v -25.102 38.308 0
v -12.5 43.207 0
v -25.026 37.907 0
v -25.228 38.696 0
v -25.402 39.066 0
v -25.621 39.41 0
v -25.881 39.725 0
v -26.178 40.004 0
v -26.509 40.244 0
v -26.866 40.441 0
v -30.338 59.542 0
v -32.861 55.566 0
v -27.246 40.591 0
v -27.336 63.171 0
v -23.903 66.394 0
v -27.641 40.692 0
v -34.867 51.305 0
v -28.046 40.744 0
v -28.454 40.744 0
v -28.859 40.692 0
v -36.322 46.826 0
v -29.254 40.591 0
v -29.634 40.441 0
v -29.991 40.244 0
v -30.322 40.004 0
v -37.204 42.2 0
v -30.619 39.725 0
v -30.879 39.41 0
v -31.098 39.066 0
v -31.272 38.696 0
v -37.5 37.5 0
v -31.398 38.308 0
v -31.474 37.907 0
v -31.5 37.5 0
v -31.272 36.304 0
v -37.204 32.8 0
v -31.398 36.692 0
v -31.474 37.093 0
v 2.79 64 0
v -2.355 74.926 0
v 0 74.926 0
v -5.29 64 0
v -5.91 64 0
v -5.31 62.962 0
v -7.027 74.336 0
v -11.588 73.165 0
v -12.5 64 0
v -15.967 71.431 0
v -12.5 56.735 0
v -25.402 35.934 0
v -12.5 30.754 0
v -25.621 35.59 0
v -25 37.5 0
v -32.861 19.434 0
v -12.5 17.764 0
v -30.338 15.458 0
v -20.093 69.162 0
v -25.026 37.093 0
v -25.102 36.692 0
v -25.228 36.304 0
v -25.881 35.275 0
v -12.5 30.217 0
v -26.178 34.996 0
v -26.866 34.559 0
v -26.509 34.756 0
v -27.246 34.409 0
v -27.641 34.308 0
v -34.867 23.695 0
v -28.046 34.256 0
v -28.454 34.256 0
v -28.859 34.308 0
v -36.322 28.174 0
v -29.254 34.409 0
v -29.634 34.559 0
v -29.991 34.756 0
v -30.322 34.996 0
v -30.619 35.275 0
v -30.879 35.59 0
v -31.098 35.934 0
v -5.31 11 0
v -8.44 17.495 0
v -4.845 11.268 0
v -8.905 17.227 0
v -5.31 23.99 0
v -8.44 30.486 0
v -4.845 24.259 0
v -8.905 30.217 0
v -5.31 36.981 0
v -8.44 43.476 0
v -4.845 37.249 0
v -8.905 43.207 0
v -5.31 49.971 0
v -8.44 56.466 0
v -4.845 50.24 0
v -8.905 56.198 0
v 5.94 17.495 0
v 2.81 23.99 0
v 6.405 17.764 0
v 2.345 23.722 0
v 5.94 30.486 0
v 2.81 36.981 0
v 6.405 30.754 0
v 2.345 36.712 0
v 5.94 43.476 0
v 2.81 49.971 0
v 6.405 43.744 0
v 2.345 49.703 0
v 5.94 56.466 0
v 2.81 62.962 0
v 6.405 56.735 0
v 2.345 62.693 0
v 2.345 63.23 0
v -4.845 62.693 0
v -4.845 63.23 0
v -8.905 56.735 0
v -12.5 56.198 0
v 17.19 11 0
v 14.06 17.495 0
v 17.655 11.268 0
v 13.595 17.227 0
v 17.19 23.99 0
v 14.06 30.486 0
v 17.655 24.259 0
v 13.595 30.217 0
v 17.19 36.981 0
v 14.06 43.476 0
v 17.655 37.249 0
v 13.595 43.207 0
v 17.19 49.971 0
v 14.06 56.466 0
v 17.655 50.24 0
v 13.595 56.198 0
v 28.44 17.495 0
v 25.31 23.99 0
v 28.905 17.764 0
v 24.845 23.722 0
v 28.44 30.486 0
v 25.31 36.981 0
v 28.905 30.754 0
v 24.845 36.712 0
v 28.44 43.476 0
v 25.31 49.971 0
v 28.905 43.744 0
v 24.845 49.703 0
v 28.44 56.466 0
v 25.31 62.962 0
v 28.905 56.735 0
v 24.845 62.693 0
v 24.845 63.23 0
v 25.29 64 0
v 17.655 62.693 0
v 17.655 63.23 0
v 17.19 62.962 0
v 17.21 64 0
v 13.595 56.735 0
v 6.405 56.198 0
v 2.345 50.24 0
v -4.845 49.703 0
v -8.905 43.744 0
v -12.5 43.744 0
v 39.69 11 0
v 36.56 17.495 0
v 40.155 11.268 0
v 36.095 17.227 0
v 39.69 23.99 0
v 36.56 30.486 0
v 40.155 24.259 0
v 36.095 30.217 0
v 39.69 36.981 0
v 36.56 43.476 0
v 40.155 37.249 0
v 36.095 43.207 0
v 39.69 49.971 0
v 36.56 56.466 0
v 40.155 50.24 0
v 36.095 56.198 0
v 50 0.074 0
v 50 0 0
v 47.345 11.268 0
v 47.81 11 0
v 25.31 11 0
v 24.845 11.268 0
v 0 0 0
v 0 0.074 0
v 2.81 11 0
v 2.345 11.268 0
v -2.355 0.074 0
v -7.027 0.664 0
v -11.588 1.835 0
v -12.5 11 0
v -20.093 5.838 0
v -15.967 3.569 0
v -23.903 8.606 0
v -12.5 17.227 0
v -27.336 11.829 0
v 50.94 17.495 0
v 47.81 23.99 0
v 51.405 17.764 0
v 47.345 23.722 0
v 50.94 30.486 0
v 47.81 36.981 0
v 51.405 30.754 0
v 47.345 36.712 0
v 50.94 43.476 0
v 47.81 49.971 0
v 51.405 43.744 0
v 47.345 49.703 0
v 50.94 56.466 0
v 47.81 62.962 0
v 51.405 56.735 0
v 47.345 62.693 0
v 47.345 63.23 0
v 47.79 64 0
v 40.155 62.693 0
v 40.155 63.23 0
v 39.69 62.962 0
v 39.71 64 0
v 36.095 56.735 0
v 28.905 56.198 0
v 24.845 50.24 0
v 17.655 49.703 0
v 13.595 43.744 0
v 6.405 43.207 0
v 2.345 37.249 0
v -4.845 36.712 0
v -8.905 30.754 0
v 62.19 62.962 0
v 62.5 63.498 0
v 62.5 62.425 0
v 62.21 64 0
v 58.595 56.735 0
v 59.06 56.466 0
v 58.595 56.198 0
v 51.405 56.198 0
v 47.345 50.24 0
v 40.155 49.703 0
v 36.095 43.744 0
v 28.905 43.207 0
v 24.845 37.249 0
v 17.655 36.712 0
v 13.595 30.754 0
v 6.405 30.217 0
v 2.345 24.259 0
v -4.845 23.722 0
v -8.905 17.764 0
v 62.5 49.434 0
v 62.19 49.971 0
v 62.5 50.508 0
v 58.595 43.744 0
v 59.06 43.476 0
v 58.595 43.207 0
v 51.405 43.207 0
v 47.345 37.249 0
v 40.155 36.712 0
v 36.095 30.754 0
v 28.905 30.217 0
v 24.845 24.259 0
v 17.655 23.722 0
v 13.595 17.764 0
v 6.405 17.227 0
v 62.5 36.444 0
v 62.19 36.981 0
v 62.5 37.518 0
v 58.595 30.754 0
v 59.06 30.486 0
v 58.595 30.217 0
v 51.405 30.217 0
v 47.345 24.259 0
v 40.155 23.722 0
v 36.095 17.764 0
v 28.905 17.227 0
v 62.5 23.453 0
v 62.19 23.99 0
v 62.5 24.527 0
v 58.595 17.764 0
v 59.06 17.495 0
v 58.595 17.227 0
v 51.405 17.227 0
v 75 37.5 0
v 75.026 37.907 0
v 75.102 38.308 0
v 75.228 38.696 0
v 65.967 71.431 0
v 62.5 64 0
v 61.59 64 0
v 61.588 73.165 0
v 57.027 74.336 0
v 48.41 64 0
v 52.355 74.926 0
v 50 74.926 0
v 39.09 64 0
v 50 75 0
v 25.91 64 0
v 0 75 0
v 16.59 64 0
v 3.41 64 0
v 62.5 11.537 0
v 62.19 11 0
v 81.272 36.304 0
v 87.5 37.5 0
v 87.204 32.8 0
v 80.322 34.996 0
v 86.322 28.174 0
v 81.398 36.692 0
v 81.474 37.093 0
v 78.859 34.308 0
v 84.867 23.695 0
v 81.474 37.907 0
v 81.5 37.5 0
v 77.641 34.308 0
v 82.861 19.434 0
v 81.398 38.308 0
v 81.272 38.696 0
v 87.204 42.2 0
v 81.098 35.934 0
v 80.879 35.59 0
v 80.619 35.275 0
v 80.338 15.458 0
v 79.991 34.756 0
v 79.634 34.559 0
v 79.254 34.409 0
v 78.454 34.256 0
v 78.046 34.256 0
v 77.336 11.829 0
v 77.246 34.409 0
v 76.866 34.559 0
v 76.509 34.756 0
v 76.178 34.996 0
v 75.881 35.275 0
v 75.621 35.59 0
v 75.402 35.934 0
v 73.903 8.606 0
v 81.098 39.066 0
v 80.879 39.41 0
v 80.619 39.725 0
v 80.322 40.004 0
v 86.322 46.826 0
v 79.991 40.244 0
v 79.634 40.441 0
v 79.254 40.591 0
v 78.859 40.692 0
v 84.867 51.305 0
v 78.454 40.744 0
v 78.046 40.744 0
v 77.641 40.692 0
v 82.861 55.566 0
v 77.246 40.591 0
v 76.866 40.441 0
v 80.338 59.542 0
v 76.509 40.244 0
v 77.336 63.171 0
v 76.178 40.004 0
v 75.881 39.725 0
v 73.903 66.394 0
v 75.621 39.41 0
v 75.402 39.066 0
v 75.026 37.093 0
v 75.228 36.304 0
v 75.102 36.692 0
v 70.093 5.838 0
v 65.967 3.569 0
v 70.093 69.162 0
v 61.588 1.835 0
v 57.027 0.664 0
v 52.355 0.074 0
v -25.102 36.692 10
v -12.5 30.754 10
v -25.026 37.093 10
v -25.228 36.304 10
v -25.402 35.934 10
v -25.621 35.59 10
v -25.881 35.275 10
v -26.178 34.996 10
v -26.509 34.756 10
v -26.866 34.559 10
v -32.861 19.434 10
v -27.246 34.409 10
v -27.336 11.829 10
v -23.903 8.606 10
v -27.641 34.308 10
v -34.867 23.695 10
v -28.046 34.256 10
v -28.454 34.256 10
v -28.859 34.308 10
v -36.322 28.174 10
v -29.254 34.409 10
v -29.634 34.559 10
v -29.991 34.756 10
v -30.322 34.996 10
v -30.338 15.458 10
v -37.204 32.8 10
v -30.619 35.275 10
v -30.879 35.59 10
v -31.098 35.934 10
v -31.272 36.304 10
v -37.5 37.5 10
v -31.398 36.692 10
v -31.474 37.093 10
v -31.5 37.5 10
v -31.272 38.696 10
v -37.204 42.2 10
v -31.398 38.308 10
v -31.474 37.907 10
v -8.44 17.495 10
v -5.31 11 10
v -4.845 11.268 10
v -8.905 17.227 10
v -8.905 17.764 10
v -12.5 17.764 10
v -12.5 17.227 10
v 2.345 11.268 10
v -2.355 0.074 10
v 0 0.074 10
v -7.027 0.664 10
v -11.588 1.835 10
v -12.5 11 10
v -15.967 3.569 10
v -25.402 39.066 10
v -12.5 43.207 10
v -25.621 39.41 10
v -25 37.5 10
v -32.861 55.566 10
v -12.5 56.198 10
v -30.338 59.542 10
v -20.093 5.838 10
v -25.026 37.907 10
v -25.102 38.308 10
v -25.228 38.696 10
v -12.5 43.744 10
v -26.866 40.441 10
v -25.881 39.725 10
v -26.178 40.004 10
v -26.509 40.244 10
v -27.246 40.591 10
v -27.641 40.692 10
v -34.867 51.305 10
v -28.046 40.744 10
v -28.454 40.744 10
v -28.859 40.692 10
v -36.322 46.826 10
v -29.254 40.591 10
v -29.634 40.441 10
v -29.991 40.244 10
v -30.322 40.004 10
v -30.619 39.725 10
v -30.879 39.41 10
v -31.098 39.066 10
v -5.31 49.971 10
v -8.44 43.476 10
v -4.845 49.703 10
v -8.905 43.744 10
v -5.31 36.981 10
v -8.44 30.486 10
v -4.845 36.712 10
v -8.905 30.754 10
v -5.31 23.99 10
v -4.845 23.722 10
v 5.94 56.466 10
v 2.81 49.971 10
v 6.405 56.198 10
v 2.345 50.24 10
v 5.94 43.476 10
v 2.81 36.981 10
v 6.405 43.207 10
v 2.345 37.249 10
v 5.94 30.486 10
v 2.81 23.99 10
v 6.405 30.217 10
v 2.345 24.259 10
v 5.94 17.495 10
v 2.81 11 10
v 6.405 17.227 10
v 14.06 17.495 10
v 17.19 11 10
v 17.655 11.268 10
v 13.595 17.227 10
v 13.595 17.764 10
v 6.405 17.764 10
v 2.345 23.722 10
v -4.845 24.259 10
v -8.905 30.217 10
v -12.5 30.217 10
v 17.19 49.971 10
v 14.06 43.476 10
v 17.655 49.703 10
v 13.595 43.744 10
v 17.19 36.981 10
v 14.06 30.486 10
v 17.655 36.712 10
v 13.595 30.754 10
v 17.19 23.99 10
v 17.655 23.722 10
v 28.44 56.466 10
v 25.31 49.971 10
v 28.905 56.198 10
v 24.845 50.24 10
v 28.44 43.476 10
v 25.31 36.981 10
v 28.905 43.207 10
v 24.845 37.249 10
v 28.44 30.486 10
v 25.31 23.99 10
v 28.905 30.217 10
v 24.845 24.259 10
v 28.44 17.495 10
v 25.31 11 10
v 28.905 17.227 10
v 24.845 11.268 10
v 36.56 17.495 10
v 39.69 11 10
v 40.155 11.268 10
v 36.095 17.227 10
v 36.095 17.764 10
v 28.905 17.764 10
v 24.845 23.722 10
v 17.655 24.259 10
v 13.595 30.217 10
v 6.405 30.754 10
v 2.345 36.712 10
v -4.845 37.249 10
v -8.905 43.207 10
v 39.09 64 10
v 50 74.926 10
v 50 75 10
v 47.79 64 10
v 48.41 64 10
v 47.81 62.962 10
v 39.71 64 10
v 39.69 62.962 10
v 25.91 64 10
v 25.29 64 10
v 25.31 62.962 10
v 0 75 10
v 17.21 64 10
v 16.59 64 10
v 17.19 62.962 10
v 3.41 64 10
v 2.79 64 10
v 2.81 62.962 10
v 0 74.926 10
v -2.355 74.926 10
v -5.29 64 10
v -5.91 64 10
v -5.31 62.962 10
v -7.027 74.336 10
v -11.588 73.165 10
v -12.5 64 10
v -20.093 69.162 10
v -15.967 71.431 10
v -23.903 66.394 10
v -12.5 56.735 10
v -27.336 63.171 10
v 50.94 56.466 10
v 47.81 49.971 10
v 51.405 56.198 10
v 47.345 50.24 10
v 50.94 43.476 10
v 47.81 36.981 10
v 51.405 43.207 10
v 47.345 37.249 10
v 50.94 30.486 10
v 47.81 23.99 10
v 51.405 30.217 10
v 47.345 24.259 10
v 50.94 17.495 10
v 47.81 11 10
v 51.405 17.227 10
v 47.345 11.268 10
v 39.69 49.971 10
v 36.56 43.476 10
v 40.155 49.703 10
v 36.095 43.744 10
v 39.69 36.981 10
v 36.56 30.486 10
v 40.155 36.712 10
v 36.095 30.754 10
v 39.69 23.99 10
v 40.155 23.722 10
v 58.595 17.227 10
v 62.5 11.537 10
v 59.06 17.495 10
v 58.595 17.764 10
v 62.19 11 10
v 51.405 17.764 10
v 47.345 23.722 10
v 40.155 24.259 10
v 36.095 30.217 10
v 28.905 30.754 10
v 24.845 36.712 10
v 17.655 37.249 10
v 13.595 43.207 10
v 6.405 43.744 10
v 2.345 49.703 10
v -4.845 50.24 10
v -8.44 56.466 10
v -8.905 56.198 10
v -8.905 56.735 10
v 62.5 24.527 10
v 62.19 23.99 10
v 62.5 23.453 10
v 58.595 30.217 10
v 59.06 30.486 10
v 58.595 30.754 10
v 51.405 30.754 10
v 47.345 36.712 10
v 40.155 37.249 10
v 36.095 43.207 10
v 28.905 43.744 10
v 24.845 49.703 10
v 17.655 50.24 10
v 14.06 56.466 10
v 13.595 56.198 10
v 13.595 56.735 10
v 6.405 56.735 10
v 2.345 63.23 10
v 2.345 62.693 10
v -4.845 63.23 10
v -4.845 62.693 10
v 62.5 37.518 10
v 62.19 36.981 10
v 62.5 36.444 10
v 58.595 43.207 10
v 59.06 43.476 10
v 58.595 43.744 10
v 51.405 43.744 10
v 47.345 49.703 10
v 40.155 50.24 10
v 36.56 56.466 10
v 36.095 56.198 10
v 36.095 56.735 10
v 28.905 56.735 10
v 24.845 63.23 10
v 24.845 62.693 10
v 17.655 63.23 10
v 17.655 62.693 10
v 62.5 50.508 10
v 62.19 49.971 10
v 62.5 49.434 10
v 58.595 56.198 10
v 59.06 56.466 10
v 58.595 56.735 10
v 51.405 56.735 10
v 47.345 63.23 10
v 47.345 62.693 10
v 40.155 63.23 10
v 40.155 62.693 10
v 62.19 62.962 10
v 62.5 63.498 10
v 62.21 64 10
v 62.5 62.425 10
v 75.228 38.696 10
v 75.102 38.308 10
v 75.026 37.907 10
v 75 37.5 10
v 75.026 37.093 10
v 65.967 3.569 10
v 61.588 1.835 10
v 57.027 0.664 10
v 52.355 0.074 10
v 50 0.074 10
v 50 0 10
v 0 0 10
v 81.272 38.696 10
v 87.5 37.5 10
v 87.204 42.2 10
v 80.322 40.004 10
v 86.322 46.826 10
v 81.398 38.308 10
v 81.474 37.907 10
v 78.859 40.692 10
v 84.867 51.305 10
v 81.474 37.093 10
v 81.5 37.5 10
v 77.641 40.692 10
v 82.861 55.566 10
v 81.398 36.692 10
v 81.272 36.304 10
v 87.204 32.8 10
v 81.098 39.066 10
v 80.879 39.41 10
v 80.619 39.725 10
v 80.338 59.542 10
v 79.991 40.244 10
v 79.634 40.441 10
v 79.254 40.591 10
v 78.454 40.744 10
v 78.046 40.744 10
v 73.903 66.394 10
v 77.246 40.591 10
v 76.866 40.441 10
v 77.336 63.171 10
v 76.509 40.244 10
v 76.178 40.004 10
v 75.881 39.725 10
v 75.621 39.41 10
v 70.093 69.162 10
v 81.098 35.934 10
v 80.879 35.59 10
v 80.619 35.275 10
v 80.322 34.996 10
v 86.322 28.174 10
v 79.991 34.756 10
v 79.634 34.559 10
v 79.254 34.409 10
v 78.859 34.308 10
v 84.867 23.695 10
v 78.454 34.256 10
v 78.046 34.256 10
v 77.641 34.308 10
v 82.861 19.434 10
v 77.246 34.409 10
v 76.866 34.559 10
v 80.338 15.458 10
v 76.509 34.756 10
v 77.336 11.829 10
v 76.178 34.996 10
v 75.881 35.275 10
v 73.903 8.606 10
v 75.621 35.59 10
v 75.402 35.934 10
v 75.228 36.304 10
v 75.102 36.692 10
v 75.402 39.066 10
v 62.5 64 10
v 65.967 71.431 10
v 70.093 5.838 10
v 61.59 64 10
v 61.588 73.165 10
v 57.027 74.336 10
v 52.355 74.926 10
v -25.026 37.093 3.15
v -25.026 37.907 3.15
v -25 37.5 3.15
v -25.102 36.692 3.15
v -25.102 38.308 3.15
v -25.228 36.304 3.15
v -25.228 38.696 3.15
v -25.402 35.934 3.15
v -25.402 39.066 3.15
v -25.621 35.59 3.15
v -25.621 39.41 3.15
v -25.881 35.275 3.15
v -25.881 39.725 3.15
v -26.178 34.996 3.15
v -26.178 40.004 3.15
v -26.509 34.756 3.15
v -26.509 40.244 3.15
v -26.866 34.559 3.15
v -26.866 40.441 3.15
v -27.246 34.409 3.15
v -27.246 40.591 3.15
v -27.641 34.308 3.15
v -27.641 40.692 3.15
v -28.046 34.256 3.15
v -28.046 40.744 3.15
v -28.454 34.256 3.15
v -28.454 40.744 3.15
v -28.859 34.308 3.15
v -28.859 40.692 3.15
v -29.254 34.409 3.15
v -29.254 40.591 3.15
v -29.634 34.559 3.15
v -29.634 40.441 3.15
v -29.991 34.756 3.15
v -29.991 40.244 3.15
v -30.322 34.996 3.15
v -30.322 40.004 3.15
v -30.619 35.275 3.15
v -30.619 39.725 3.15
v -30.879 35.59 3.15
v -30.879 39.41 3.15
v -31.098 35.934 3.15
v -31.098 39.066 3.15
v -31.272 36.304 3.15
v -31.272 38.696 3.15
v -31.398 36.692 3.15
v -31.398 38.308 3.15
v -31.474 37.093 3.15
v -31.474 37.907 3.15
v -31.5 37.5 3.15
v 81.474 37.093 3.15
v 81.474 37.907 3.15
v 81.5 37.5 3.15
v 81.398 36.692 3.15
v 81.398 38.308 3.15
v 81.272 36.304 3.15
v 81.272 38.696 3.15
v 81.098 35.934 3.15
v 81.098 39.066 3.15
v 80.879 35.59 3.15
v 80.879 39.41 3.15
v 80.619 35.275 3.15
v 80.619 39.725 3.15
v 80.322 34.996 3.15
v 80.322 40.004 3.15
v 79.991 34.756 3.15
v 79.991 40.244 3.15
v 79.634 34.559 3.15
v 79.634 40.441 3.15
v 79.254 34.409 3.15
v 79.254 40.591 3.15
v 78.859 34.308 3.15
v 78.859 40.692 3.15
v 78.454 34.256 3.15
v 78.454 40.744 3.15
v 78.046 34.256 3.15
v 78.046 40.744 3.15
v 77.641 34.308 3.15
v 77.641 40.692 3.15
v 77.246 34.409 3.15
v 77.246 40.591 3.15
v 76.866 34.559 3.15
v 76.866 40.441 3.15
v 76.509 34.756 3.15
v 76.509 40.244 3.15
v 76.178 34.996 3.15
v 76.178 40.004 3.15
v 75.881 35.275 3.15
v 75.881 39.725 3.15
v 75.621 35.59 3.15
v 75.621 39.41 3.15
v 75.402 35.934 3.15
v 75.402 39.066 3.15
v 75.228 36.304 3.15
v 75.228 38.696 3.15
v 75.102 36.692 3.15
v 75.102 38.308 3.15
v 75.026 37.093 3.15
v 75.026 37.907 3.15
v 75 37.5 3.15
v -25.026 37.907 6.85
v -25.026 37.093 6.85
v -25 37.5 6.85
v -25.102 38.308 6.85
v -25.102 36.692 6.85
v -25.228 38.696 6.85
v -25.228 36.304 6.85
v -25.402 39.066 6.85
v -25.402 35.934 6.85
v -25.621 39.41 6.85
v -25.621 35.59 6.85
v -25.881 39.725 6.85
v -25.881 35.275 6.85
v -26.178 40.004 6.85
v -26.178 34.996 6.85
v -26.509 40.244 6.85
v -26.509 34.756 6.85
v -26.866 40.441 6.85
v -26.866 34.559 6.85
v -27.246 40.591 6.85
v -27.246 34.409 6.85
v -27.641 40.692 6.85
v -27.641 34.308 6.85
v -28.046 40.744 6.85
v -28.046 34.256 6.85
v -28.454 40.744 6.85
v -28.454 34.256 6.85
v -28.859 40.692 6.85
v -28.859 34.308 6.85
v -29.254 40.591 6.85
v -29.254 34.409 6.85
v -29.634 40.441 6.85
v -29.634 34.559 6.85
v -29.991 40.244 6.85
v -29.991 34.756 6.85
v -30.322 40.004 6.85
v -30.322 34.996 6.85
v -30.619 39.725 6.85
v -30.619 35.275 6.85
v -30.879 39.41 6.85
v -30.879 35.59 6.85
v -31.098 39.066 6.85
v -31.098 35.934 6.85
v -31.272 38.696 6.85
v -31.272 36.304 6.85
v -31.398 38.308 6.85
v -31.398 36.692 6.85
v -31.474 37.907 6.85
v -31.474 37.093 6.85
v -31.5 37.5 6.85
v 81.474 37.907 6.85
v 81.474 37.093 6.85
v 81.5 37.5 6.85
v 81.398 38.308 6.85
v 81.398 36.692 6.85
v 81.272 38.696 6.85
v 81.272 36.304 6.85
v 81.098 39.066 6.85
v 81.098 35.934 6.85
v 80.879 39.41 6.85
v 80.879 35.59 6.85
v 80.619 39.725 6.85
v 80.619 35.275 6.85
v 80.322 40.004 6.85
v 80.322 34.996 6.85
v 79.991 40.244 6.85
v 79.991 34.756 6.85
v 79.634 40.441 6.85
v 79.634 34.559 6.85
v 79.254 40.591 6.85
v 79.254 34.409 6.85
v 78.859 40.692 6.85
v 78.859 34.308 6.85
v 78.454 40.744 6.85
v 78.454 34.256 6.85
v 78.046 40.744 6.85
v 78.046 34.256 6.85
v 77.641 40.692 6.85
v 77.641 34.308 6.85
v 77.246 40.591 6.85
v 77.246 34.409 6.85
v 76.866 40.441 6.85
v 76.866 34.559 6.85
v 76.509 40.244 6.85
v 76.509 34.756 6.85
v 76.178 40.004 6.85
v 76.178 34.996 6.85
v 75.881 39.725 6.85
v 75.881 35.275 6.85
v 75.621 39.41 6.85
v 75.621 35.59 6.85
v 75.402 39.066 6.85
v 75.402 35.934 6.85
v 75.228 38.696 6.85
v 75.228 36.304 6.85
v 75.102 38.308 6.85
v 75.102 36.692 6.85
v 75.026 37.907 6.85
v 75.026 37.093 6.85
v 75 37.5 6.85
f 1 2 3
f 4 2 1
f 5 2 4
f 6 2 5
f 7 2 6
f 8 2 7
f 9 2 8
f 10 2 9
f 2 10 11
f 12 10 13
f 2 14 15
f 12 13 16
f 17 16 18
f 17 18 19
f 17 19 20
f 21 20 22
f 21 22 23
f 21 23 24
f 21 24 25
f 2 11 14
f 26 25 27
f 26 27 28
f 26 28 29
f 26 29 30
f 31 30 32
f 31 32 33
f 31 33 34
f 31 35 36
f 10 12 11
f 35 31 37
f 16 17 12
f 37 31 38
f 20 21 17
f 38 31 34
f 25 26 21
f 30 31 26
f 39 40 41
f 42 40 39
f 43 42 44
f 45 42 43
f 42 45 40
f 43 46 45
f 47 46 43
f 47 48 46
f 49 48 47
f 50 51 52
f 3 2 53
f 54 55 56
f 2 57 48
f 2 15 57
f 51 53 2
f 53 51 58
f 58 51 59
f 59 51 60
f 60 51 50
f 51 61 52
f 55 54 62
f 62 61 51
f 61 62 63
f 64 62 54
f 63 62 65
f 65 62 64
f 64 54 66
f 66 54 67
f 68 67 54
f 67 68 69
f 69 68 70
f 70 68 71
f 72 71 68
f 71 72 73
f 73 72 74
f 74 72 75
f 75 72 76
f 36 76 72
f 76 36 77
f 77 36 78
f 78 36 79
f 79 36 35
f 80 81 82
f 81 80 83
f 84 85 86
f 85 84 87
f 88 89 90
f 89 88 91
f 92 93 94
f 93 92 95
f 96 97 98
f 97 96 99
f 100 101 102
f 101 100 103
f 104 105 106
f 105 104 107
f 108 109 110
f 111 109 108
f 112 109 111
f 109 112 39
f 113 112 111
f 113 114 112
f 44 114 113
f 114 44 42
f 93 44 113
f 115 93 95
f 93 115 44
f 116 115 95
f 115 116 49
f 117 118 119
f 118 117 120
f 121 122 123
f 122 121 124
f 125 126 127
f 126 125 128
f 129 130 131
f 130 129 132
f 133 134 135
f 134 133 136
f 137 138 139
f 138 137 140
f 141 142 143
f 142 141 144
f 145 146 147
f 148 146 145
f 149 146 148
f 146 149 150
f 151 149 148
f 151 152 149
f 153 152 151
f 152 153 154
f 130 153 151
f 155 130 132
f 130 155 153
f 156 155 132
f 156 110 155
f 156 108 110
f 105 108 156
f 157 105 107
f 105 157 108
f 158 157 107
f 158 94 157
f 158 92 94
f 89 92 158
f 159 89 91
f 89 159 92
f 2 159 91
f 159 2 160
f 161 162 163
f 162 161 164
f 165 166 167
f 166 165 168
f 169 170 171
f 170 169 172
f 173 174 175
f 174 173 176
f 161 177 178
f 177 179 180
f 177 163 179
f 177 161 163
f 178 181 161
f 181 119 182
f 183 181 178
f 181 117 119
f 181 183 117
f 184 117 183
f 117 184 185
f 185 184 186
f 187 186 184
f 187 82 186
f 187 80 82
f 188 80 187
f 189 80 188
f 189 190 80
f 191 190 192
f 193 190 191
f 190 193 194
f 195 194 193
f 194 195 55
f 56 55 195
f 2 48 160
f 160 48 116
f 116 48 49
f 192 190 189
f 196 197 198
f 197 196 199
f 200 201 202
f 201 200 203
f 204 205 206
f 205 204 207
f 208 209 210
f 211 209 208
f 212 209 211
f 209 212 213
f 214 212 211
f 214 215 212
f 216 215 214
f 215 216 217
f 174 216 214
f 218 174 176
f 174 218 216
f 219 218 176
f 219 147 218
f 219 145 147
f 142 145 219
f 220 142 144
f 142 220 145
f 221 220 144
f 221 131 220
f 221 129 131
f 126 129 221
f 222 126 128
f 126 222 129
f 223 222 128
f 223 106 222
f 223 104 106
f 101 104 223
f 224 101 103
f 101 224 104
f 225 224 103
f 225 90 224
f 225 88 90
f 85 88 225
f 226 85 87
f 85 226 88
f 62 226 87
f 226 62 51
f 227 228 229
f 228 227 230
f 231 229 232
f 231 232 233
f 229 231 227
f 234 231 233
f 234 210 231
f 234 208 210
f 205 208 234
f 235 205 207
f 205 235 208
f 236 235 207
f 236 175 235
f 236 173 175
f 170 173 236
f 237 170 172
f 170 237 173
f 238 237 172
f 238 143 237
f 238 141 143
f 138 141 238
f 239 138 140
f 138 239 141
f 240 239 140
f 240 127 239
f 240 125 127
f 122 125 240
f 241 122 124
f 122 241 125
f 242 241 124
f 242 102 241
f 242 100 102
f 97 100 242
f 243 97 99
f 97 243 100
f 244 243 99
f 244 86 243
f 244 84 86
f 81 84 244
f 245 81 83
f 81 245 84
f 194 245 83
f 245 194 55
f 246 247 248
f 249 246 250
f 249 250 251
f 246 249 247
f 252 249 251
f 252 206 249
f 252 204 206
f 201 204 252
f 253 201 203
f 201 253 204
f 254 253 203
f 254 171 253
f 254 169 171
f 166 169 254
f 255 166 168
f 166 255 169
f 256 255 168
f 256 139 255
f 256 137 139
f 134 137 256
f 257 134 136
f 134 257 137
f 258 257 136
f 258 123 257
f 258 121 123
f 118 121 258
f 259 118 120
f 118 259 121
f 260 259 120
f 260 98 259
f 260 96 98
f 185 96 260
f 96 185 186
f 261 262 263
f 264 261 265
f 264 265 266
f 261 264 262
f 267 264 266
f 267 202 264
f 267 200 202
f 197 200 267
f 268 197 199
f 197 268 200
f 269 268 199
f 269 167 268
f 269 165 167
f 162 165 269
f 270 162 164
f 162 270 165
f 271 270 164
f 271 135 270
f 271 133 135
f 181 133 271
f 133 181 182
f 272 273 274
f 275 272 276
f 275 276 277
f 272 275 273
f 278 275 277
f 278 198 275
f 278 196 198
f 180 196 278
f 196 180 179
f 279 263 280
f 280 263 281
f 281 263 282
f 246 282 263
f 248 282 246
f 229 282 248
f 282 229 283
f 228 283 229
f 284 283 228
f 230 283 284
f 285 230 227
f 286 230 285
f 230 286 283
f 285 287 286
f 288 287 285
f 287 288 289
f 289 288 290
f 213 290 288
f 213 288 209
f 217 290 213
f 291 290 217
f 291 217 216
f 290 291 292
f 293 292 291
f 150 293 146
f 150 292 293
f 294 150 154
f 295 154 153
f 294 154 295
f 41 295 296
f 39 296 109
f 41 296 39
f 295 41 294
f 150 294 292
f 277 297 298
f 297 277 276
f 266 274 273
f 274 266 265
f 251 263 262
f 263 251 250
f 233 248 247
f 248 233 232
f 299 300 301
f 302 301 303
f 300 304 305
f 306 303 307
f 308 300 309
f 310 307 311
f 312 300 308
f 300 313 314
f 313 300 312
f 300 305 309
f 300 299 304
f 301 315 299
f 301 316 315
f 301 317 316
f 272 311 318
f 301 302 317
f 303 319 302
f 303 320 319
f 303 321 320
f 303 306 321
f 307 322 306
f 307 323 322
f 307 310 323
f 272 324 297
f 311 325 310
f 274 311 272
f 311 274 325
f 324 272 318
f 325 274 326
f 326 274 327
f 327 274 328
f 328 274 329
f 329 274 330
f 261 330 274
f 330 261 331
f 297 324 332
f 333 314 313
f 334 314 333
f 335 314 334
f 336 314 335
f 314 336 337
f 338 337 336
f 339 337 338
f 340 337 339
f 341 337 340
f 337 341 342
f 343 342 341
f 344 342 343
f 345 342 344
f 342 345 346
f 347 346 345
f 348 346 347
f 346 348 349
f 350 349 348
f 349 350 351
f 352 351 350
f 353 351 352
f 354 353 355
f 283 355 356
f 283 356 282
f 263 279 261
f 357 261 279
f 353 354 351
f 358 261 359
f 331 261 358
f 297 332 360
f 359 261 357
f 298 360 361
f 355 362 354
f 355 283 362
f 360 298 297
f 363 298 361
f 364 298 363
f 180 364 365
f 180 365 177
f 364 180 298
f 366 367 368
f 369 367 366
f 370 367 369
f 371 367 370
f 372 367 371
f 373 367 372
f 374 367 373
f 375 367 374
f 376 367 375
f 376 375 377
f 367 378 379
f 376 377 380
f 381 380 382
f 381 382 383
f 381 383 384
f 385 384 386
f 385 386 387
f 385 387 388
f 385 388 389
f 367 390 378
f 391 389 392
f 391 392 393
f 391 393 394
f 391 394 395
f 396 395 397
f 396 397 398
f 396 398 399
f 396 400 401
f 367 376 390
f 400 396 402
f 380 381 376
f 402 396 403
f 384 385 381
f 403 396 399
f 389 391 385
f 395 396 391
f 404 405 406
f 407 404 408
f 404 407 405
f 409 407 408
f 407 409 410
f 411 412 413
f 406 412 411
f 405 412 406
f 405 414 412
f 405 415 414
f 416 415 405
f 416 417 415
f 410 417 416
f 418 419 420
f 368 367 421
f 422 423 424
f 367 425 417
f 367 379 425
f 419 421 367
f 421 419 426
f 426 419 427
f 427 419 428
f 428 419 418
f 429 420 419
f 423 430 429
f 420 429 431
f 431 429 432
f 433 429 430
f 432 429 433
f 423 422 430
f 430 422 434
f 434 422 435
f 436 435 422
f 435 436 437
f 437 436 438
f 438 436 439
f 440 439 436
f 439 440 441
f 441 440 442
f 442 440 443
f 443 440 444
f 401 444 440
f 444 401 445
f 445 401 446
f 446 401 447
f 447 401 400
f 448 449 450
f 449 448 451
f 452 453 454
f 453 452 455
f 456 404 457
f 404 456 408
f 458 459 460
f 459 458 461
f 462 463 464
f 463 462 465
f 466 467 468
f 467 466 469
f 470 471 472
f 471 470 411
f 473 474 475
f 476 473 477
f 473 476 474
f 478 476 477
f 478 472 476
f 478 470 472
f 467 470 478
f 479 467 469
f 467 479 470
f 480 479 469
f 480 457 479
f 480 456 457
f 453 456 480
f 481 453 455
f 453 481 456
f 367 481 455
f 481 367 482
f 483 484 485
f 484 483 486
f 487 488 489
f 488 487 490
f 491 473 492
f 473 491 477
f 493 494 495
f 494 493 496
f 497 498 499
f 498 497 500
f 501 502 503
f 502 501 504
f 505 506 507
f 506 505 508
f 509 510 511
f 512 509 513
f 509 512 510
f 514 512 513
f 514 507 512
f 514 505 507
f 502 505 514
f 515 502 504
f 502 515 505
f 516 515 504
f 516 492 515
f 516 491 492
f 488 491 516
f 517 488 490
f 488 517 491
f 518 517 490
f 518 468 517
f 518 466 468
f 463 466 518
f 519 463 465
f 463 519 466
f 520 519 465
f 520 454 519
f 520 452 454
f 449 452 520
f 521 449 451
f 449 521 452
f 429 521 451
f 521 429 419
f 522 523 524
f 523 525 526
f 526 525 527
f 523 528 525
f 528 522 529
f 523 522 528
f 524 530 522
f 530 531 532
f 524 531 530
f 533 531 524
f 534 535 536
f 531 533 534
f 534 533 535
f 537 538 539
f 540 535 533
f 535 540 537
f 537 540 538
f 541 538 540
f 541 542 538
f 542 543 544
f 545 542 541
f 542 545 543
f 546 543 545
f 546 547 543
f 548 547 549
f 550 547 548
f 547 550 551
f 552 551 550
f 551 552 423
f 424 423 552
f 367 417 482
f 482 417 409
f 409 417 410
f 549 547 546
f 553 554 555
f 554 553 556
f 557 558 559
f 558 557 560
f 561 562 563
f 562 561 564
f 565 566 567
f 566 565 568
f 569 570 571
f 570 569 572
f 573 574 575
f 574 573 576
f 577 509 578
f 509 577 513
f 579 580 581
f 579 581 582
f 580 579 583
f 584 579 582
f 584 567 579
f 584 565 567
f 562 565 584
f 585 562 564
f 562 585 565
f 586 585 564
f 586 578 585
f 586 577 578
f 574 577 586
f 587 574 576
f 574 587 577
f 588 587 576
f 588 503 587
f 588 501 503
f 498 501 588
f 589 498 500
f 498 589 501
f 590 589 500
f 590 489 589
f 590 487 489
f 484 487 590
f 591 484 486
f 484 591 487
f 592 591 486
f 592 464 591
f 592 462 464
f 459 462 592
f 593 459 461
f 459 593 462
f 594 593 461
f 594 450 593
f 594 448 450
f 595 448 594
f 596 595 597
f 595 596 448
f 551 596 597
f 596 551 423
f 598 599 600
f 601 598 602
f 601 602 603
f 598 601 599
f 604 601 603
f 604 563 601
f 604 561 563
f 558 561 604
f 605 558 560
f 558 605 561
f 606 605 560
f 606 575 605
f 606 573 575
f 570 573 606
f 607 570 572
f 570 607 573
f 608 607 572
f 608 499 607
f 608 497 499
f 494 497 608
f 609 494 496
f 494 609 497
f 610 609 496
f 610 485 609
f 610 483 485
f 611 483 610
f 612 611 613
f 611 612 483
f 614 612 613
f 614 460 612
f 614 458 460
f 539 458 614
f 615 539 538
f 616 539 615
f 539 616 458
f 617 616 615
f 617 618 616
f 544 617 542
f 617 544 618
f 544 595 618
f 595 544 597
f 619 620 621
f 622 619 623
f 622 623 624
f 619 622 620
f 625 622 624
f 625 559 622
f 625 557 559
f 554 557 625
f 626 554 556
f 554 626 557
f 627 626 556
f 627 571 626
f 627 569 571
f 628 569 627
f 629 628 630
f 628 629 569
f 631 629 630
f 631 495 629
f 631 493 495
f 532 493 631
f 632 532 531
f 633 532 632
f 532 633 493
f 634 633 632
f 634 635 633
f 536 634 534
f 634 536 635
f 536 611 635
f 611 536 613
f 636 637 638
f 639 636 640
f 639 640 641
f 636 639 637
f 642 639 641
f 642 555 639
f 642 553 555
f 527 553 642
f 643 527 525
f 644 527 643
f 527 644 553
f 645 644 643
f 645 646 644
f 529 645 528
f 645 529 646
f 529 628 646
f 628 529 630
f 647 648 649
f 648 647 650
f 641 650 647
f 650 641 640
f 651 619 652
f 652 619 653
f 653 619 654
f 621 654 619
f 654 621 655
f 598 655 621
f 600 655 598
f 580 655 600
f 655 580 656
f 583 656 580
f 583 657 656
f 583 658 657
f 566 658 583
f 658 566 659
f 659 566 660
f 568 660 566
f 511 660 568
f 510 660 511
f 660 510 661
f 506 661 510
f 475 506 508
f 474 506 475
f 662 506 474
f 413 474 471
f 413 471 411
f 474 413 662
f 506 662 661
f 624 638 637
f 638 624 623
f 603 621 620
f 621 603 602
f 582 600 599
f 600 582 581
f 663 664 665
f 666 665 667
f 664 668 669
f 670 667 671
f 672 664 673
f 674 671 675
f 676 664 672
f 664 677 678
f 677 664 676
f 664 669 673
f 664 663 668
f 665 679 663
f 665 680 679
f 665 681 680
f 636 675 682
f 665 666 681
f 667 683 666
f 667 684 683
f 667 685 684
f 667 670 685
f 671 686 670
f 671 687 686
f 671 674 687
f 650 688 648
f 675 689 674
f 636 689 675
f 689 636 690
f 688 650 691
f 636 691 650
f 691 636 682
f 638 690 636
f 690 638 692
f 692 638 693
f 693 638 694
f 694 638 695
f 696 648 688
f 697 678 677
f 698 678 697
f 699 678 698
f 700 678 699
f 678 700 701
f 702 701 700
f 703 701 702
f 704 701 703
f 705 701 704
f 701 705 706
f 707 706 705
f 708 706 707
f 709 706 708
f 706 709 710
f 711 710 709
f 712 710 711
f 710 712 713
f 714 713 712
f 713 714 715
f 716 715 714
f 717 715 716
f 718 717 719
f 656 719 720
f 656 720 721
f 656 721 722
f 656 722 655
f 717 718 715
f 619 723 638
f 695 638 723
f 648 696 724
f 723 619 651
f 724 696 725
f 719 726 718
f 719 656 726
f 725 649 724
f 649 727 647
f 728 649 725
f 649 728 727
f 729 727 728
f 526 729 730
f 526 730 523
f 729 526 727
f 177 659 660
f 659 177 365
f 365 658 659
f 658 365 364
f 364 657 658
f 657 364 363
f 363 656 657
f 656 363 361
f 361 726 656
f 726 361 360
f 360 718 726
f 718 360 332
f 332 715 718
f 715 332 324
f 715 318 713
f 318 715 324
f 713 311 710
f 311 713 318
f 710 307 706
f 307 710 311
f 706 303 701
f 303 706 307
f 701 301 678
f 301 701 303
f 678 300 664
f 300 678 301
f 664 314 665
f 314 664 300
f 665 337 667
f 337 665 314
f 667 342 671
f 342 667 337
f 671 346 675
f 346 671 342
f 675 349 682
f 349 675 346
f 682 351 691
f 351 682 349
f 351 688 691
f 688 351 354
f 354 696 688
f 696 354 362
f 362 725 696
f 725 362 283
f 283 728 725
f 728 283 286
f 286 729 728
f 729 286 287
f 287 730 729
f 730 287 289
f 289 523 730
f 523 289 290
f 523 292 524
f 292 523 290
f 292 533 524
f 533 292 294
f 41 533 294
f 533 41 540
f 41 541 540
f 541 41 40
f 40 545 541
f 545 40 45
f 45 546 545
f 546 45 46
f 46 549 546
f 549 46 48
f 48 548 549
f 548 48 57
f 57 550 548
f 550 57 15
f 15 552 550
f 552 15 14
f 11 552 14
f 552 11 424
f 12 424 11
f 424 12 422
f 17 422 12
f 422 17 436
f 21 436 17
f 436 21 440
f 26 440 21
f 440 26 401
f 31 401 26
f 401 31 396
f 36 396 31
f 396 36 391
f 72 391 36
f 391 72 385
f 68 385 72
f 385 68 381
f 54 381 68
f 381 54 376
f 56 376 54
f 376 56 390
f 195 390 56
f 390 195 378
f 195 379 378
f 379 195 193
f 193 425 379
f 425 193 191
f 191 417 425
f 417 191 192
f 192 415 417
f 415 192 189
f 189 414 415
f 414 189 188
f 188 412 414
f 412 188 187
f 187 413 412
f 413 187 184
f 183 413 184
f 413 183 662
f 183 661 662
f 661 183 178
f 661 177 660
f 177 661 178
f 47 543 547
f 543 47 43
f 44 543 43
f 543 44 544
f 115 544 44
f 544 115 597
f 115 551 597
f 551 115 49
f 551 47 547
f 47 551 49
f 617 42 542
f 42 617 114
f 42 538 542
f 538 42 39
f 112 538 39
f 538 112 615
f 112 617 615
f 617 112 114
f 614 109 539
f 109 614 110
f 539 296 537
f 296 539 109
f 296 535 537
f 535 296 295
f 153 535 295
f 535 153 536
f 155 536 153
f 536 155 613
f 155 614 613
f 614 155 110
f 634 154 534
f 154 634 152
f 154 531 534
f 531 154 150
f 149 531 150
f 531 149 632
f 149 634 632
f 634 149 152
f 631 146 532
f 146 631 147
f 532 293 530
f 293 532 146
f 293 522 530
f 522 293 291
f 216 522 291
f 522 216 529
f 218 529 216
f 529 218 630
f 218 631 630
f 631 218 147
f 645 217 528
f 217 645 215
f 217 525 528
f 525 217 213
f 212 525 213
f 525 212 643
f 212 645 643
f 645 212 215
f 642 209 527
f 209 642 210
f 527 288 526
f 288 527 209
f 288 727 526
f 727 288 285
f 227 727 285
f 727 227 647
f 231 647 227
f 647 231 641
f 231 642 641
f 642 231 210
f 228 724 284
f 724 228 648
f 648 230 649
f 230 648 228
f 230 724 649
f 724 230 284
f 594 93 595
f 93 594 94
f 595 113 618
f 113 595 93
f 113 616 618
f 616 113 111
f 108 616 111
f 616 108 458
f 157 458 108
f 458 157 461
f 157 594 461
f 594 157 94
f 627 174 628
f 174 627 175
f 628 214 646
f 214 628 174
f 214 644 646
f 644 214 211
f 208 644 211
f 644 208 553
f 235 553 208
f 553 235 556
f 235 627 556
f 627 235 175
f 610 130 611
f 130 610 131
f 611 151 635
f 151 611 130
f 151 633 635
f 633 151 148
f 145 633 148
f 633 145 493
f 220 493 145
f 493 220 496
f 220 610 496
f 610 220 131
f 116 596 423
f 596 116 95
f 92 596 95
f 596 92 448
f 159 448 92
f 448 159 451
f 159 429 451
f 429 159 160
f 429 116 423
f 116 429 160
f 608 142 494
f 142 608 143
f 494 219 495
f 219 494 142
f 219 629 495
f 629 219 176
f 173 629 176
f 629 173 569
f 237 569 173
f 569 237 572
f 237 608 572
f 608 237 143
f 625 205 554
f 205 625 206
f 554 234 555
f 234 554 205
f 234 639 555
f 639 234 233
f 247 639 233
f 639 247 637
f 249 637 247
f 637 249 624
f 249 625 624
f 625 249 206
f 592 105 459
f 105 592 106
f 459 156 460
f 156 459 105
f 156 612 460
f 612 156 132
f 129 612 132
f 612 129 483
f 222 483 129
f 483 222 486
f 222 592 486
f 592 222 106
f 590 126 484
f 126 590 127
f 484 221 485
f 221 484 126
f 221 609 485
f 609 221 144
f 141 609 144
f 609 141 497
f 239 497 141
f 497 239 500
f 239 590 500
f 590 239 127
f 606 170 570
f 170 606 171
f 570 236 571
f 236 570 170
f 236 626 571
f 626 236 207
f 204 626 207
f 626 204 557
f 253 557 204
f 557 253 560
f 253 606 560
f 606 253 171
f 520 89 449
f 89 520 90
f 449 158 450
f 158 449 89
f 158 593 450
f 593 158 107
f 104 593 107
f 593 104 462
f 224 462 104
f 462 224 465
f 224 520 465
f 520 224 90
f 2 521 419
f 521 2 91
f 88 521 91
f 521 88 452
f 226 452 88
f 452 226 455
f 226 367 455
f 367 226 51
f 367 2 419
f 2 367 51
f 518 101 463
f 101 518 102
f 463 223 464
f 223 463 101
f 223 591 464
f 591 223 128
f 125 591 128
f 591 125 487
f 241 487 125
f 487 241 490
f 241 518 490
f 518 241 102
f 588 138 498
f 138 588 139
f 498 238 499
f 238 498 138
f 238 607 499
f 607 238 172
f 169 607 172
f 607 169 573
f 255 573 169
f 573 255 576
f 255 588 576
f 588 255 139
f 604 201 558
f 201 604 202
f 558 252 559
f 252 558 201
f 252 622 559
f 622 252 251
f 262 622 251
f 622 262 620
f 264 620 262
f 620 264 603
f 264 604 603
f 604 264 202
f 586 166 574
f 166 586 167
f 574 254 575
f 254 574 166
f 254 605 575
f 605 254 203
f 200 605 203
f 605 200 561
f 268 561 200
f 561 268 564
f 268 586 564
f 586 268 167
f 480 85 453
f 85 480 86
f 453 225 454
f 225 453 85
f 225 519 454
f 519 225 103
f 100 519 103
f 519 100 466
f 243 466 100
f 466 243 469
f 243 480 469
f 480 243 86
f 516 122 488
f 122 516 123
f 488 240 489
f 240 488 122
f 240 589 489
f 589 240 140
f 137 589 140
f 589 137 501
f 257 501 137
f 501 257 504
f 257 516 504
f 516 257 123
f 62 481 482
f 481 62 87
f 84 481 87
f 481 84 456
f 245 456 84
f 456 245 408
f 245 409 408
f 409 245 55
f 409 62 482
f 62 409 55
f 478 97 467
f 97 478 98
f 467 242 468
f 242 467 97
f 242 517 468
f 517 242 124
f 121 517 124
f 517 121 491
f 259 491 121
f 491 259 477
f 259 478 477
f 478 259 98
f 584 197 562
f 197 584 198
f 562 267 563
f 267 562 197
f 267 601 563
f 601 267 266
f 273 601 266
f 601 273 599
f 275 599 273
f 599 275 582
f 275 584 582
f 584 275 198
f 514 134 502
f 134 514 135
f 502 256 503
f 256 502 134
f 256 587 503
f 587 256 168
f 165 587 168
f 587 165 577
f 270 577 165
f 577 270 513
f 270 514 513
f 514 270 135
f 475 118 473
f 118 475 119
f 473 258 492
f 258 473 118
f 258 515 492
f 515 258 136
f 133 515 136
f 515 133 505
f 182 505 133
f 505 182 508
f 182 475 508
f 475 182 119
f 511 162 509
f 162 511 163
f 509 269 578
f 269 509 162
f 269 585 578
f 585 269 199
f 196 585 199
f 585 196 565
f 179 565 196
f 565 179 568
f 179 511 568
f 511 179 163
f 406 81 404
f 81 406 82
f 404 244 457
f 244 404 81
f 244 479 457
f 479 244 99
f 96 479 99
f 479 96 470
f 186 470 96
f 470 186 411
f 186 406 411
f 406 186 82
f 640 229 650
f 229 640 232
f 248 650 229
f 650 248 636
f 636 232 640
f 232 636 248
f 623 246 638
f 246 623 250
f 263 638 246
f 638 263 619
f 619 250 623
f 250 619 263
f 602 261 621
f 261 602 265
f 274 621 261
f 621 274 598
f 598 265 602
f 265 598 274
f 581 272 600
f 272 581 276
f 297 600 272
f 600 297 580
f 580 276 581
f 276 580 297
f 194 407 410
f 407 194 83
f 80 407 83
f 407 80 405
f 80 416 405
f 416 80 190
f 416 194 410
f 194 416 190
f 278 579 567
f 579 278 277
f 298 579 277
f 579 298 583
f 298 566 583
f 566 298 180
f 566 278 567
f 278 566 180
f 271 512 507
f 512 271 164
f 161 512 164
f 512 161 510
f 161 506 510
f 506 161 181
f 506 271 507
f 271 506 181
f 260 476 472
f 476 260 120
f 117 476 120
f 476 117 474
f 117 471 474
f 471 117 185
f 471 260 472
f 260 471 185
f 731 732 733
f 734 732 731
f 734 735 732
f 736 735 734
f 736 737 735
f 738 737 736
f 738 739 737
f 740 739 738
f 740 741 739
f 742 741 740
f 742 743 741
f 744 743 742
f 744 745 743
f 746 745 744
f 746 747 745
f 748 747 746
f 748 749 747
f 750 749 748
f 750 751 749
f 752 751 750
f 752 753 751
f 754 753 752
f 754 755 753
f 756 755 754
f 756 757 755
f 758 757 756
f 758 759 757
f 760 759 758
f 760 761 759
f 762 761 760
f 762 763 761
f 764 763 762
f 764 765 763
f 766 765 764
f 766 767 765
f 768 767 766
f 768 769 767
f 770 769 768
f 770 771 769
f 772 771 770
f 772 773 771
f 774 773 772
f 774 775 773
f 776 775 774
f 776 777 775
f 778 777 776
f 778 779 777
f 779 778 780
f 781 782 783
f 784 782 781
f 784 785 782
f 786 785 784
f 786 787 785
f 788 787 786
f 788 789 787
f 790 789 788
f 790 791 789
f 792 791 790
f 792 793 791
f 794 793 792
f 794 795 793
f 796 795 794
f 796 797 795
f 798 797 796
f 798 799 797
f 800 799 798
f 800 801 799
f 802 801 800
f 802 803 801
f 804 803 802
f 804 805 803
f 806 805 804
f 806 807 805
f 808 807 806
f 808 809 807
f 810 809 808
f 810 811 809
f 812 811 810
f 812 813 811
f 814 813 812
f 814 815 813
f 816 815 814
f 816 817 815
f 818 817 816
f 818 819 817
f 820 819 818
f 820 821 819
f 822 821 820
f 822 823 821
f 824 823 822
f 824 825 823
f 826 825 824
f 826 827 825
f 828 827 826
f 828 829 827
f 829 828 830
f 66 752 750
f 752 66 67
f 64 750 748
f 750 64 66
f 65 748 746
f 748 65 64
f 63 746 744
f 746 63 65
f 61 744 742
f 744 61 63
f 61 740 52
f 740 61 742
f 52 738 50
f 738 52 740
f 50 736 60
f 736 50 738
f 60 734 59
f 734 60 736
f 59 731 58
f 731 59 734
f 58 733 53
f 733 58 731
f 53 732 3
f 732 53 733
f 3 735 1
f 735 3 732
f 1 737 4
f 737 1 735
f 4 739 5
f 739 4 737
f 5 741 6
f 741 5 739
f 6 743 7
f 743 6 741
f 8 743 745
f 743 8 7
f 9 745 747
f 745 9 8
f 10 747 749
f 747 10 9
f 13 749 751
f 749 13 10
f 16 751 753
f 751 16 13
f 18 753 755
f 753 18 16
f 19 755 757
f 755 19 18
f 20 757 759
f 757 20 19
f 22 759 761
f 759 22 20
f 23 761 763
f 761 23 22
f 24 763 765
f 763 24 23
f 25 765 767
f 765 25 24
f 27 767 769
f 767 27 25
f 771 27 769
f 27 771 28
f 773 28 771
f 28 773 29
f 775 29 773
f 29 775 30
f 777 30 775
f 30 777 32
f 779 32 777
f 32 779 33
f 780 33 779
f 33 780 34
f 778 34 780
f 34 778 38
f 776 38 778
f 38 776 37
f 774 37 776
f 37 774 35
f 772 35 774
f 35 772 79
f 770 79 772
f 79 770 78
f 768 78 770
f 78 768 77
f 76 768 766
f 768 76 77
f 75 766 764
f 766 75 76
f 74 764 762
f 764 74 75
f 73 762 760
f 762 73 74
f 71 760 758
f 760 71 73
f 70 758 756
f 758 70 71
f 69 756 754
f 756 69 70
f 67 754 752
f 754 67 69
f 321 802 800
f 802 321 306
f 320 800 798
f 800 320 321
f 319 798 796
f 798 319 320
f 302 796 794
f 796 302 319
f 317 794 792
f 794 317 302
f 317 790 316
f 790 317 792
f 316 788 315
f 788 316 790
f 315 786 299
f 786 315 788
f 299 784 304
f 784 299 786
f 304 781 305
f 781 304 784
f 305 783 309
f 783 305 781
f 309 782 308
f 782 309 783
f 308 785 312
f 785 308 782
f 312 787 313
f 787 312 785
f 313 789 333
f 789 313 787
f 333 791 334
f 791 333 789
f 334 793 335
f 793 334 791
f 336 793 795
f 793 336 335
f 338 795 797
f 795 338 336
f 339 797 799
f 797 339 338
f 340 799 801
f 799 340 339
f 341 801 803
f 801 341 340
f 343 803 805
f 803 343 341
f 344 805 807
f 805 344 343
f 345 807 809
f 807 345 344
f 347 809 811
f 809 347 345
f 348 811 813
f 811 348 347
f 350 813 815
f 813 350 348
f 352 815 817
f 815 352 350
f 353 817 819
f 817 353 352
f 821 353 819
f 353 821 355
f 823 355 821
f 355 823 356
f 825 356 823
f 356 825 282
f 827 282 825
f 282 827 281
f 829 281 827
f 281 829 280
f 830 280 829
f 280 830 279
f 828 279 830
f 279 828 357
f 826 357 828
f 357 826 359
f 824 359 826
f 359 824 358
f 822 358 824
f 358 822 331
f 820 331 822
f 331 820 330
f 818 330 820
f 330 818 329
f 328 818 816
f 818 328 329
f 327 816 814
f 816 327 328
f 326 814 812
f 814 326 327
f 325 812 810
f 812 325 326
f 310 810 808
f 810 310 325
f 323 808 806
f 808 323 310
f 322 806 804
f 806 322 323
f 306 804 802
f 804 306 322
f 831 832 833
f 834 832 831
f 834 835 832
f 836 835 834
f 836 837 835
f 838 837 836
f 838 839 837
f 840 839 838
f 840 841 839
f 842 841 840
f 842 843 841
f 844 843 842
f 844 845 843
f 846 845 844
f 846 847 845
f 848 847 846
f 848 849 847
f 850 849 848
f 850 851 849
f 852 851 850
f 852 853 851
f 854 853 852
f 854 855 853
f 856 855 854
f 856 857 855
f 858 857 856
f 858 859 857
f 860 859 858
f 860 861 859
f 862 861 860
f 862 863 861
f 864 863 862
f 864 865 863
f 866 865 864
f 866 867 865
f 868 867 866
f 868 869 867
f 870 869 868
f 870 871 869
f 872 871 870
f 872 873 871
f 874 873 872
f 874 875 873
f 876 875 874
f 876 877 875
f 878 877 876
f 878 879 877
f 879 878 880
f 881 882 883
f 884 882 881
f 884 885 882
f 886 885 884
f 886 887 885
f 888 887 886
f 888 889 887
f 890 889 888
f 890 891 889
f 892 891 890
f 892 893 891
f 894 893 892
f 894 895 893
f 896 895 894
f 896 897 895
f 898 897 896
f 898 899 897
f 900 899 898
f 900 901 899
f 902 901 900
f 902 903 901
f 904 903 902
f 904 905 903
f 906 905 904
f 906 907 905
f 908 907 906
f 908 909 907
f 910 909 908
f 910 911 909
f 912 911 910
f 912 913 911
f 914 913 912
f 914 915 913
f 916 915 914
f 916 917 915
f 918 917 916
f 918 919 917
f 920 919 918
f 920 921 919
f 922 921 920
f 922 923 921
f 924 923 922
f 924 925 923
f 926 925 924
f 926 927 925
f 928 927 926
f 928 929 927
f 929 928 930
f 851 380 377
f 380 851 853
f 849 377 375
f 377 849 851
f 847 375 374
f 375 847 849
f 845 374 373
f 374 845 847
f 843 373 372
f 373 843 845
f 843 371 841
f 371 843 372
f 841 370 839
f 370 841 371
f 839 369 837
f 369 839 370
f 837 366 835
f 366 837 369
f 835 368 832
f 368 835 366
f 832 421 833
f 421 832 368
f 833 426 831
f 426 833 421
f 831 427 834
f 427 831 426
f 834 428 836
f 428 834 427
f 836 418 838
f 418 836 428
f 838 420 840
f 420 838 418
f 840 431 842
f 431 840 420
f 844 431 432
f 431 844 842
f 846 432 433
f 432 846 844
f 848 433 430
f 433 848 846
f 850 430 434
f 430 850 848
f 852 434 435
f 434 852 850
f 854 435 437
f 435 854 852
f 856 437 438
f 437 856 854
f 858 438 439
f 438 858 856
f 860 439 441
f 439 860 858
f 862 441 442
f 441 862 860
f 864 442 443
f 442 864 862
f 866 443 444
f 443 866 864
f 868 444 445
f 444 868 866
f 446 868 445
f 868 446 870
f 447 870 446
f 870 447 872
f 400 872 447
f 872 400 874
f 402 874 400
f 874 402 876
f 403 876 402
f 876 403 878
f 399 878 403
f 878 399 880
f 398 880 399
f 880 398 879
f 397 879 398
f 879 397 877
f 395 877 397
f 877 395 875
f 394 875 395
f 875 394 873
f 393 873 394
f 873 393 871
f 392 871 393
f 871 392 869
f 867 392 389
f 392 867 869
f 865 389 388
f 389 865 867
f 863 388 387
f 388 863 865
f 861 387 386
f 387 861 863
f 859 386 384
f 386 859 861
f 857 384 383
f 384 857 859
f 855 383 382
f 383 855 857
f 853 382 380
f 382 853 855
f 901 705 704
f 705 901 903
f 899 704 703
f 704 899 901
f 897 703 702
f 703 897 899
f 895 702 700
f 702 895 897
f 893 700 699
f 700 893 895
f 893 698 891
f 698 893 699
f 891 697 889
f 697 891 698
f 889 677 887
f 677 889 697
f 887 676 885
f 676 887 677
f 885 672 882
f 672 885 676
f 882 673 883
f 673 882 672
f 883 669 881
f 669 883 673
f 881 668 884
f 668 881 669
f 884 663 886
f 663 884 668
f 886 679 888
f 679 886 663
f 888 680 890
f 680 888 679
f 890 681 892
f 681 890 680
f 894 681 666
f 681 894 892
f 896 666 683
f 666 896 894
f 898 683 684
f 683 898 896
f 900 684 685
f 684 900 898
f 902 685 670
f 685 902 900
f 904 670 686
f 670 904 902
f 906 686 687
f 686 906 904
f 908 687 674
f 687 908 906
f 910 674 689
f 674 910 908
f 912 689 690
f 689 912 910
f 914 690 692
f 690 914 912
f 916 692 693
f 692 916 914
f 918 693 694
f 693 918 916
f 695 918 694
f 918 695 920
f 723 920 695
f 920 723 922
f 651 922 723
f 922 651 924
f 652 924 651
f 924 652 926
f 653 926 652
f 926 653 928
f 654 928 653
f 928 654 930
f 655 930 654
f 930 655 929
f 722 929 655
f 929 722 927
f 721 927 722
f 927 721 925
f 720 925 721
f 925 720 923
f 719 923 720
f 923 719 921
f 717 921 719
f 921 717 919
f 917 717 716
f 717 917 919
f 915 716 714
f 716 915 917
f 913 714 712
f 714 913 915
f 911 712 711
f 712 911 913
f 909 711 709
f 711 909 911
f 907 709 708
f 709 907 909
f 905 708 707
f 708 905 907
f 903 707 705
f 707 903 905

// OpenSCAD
//////////////////////
/// Thing: Customizable Grid for Canon Speedlight
/// For use with http://www.thingiverse.com/thing:1185771 (Canon Speedlite 600EX-RT - CGprods KIT)
/// Author: Kim Quermann
/// Creative Commons - Attribution - just provide cedit to this thing
//////////////////////


/////////////////////
/// Change these Parameters
/////////////////////
twoSidedHole = "yes";
hexRadius=7.5;
showHexRadiusAsLabel = "no";

////////////////////
/// Nothing to change for Speedlight
////////////////////
outerWidth = 125;
outerHeight = 75;
outerRadius = outerHeight/2;
baseHeight = 10;
innerWidth = 75;
innerHeight = 53; // maybe 47 
holeDiameter = 6.5;
holeDepth = 3.15;
holeDistance = 6+0.5*holeDiameter;
hexBorderWidth=0.31; // be careful with this value. For too little value, the grid will not be printed. Min Value: 0.29 for shell thickness 1.5 in Cura

yStepHeight=2*sqrt(3/4*hexRadius*hexRadius);
xStepWidth=2*hexRadius*0.75;


///////////////
// RENDER

union(){
    
    difference(){
    linear_extrude( height = baseHeight)
        assembledGrid();
    linear_extrude(height = holeDepth)
        magnetHoles();
    if (twoSidedHole == "yes"){
        translate([0,0,baseHeight-holeDepth]) linear_extrude(height = holeDepth)
        magnetHoles();
        }  
    }
    
    if(showHexRadiusAsLabel == "yes"){
    rotate(a=[90,0,0])
    translate([5,5,0])
    linear_extrude(height = 1.5){
        text(text = str(hexRadius, " mm"), font = "Liberation Sans", size = 7, valign = "center");
    }
}
}
   



//////////////
// MODULES

module assembledGrid(){
    union(){
        baseShape();

        // Gesamt: outerWidth
        // Mittelpunkt(X):  (outerWidth-2*outerRadius)*0,5
        // mesh muss 0.5*Meshbreite nach links vom Mittelpunkt
        
       translate([outerRadius-(outerWidth-innerWidth),(outerHeight-innerHeight)/2]) mesh();
        }
    }

module baseShape(){
    difference(){
        union(){
            square([outerWidth-2*outerRadius,outerHeight]);
            translate([0,outerRadius,0]) circle(r=outerRadius, $fn=50);
            translate([outerWidth-2*outerRadius,outerRadius,0]) circle(r=outerRadius, $fn=50);
        }
        translate([outerRadius-(outerWidth-innerWidth),(outerHeight-innerHeight)/2])
        innerShape();
    }
}
module innerShape(add=0){
    square([innerWidth+add,innerHeight+add]);
    }
module magnetHoles(){
    translate([-outerRadius + holeDistance, outerRadius, 0]) circle(d=holeDiameter, $fn=50);
    translate([outerWidth-outerRadius-holeDistance, outerRadius,0]) circle(d=holeDiameter, $fn=50);
    }
    
module hex(x,y){
    
    
//    // Example mesh
//    hex(0*xStepWidth, 0*yStepHeight);
//    hex(1*xStepWidth, 0*yStepHeight + 0.5*yStepHeight);
//    hex(2*xStepWidth, 0*yStepHeight);
//    hex(3*xStepWidth, 0*yStepHeight + 0.5*yStepHeight);
//    hex(4*xStepWidth, 0*yStepHeight);
//    hex(5*xStepWidth, 0*yStepHeight + 0.5*yStepHeight);
//    hex(6*xStepWidth, 0*yStepHeight);
//    hex(7*xStepWidth, 0*yStepHeight + 0.5*yStepHeight);
//    // second row
//    hex(0*xStepWidth, 1*yStepHeight);
//    hex(1*xStepWidth, 1*yStepHeight +0.5*yStepHeight);
//    hex(2*xStepWidth, 1*yStepHeight);
//    hex(3*xStepWidth, 1*yStepHeight + 0.5*yStepHeight);
//    hex(4*xStepWidth, 1*yStepHeight);
//    hex(5*xStepWidth, 1*yStepHeight +0.5*yStepHeight);
//    hex(6*xStepWidth, 1*yStepHeight);
//    hex(7*xStepWidth, 1*yStepHeight + 0.5*yStepHeight);
//    // third row
//    hex(0*xStepWidth, 2*yStepHeight);
//    hex(1*xStepWidth, 2*yStepHeight +0.5*yStepHeight);
//    hex(2*xStepWidth, 2*yStepHeight);
//    hex(3*xStepWidth, 2*yStepHeight + 0.5*yStepHeight);
//    hex(4*xStepWidth, 2*yStepHeight);
//    hex(5*xStepWidth, 2*yStepHeight +0.5*yStepHeight);
//    hex(6*xStepWidth, 2*yStepHeight);
//    hex(7*xStepWidth, 2*yStepHeight + 0.5*yStepHeight);
    
    
	difference(){
		translate([x,y,0]) 
		circle(r=(hexRadius+hexBorderWidth), $fn=6);	
		translate([x,y,0]) 
		circle(r=(hexRadius-hexBorderWidth), $fn=6);
	}
}    
    
module mesh(){   
    xSteps = innerWidth / xStepWidth;
    ySteps = innerHeight / yStepHeight;
    intersection(){
        for (yi=[0:1:ySteps])
            for(xi=[0:1:xSteps]){
                hex(xi*xStepWidth,yi*yStepHeight+( xi%2==0?0:0.5*yStepHeight ));
            }
        innerShape();
    }
}
